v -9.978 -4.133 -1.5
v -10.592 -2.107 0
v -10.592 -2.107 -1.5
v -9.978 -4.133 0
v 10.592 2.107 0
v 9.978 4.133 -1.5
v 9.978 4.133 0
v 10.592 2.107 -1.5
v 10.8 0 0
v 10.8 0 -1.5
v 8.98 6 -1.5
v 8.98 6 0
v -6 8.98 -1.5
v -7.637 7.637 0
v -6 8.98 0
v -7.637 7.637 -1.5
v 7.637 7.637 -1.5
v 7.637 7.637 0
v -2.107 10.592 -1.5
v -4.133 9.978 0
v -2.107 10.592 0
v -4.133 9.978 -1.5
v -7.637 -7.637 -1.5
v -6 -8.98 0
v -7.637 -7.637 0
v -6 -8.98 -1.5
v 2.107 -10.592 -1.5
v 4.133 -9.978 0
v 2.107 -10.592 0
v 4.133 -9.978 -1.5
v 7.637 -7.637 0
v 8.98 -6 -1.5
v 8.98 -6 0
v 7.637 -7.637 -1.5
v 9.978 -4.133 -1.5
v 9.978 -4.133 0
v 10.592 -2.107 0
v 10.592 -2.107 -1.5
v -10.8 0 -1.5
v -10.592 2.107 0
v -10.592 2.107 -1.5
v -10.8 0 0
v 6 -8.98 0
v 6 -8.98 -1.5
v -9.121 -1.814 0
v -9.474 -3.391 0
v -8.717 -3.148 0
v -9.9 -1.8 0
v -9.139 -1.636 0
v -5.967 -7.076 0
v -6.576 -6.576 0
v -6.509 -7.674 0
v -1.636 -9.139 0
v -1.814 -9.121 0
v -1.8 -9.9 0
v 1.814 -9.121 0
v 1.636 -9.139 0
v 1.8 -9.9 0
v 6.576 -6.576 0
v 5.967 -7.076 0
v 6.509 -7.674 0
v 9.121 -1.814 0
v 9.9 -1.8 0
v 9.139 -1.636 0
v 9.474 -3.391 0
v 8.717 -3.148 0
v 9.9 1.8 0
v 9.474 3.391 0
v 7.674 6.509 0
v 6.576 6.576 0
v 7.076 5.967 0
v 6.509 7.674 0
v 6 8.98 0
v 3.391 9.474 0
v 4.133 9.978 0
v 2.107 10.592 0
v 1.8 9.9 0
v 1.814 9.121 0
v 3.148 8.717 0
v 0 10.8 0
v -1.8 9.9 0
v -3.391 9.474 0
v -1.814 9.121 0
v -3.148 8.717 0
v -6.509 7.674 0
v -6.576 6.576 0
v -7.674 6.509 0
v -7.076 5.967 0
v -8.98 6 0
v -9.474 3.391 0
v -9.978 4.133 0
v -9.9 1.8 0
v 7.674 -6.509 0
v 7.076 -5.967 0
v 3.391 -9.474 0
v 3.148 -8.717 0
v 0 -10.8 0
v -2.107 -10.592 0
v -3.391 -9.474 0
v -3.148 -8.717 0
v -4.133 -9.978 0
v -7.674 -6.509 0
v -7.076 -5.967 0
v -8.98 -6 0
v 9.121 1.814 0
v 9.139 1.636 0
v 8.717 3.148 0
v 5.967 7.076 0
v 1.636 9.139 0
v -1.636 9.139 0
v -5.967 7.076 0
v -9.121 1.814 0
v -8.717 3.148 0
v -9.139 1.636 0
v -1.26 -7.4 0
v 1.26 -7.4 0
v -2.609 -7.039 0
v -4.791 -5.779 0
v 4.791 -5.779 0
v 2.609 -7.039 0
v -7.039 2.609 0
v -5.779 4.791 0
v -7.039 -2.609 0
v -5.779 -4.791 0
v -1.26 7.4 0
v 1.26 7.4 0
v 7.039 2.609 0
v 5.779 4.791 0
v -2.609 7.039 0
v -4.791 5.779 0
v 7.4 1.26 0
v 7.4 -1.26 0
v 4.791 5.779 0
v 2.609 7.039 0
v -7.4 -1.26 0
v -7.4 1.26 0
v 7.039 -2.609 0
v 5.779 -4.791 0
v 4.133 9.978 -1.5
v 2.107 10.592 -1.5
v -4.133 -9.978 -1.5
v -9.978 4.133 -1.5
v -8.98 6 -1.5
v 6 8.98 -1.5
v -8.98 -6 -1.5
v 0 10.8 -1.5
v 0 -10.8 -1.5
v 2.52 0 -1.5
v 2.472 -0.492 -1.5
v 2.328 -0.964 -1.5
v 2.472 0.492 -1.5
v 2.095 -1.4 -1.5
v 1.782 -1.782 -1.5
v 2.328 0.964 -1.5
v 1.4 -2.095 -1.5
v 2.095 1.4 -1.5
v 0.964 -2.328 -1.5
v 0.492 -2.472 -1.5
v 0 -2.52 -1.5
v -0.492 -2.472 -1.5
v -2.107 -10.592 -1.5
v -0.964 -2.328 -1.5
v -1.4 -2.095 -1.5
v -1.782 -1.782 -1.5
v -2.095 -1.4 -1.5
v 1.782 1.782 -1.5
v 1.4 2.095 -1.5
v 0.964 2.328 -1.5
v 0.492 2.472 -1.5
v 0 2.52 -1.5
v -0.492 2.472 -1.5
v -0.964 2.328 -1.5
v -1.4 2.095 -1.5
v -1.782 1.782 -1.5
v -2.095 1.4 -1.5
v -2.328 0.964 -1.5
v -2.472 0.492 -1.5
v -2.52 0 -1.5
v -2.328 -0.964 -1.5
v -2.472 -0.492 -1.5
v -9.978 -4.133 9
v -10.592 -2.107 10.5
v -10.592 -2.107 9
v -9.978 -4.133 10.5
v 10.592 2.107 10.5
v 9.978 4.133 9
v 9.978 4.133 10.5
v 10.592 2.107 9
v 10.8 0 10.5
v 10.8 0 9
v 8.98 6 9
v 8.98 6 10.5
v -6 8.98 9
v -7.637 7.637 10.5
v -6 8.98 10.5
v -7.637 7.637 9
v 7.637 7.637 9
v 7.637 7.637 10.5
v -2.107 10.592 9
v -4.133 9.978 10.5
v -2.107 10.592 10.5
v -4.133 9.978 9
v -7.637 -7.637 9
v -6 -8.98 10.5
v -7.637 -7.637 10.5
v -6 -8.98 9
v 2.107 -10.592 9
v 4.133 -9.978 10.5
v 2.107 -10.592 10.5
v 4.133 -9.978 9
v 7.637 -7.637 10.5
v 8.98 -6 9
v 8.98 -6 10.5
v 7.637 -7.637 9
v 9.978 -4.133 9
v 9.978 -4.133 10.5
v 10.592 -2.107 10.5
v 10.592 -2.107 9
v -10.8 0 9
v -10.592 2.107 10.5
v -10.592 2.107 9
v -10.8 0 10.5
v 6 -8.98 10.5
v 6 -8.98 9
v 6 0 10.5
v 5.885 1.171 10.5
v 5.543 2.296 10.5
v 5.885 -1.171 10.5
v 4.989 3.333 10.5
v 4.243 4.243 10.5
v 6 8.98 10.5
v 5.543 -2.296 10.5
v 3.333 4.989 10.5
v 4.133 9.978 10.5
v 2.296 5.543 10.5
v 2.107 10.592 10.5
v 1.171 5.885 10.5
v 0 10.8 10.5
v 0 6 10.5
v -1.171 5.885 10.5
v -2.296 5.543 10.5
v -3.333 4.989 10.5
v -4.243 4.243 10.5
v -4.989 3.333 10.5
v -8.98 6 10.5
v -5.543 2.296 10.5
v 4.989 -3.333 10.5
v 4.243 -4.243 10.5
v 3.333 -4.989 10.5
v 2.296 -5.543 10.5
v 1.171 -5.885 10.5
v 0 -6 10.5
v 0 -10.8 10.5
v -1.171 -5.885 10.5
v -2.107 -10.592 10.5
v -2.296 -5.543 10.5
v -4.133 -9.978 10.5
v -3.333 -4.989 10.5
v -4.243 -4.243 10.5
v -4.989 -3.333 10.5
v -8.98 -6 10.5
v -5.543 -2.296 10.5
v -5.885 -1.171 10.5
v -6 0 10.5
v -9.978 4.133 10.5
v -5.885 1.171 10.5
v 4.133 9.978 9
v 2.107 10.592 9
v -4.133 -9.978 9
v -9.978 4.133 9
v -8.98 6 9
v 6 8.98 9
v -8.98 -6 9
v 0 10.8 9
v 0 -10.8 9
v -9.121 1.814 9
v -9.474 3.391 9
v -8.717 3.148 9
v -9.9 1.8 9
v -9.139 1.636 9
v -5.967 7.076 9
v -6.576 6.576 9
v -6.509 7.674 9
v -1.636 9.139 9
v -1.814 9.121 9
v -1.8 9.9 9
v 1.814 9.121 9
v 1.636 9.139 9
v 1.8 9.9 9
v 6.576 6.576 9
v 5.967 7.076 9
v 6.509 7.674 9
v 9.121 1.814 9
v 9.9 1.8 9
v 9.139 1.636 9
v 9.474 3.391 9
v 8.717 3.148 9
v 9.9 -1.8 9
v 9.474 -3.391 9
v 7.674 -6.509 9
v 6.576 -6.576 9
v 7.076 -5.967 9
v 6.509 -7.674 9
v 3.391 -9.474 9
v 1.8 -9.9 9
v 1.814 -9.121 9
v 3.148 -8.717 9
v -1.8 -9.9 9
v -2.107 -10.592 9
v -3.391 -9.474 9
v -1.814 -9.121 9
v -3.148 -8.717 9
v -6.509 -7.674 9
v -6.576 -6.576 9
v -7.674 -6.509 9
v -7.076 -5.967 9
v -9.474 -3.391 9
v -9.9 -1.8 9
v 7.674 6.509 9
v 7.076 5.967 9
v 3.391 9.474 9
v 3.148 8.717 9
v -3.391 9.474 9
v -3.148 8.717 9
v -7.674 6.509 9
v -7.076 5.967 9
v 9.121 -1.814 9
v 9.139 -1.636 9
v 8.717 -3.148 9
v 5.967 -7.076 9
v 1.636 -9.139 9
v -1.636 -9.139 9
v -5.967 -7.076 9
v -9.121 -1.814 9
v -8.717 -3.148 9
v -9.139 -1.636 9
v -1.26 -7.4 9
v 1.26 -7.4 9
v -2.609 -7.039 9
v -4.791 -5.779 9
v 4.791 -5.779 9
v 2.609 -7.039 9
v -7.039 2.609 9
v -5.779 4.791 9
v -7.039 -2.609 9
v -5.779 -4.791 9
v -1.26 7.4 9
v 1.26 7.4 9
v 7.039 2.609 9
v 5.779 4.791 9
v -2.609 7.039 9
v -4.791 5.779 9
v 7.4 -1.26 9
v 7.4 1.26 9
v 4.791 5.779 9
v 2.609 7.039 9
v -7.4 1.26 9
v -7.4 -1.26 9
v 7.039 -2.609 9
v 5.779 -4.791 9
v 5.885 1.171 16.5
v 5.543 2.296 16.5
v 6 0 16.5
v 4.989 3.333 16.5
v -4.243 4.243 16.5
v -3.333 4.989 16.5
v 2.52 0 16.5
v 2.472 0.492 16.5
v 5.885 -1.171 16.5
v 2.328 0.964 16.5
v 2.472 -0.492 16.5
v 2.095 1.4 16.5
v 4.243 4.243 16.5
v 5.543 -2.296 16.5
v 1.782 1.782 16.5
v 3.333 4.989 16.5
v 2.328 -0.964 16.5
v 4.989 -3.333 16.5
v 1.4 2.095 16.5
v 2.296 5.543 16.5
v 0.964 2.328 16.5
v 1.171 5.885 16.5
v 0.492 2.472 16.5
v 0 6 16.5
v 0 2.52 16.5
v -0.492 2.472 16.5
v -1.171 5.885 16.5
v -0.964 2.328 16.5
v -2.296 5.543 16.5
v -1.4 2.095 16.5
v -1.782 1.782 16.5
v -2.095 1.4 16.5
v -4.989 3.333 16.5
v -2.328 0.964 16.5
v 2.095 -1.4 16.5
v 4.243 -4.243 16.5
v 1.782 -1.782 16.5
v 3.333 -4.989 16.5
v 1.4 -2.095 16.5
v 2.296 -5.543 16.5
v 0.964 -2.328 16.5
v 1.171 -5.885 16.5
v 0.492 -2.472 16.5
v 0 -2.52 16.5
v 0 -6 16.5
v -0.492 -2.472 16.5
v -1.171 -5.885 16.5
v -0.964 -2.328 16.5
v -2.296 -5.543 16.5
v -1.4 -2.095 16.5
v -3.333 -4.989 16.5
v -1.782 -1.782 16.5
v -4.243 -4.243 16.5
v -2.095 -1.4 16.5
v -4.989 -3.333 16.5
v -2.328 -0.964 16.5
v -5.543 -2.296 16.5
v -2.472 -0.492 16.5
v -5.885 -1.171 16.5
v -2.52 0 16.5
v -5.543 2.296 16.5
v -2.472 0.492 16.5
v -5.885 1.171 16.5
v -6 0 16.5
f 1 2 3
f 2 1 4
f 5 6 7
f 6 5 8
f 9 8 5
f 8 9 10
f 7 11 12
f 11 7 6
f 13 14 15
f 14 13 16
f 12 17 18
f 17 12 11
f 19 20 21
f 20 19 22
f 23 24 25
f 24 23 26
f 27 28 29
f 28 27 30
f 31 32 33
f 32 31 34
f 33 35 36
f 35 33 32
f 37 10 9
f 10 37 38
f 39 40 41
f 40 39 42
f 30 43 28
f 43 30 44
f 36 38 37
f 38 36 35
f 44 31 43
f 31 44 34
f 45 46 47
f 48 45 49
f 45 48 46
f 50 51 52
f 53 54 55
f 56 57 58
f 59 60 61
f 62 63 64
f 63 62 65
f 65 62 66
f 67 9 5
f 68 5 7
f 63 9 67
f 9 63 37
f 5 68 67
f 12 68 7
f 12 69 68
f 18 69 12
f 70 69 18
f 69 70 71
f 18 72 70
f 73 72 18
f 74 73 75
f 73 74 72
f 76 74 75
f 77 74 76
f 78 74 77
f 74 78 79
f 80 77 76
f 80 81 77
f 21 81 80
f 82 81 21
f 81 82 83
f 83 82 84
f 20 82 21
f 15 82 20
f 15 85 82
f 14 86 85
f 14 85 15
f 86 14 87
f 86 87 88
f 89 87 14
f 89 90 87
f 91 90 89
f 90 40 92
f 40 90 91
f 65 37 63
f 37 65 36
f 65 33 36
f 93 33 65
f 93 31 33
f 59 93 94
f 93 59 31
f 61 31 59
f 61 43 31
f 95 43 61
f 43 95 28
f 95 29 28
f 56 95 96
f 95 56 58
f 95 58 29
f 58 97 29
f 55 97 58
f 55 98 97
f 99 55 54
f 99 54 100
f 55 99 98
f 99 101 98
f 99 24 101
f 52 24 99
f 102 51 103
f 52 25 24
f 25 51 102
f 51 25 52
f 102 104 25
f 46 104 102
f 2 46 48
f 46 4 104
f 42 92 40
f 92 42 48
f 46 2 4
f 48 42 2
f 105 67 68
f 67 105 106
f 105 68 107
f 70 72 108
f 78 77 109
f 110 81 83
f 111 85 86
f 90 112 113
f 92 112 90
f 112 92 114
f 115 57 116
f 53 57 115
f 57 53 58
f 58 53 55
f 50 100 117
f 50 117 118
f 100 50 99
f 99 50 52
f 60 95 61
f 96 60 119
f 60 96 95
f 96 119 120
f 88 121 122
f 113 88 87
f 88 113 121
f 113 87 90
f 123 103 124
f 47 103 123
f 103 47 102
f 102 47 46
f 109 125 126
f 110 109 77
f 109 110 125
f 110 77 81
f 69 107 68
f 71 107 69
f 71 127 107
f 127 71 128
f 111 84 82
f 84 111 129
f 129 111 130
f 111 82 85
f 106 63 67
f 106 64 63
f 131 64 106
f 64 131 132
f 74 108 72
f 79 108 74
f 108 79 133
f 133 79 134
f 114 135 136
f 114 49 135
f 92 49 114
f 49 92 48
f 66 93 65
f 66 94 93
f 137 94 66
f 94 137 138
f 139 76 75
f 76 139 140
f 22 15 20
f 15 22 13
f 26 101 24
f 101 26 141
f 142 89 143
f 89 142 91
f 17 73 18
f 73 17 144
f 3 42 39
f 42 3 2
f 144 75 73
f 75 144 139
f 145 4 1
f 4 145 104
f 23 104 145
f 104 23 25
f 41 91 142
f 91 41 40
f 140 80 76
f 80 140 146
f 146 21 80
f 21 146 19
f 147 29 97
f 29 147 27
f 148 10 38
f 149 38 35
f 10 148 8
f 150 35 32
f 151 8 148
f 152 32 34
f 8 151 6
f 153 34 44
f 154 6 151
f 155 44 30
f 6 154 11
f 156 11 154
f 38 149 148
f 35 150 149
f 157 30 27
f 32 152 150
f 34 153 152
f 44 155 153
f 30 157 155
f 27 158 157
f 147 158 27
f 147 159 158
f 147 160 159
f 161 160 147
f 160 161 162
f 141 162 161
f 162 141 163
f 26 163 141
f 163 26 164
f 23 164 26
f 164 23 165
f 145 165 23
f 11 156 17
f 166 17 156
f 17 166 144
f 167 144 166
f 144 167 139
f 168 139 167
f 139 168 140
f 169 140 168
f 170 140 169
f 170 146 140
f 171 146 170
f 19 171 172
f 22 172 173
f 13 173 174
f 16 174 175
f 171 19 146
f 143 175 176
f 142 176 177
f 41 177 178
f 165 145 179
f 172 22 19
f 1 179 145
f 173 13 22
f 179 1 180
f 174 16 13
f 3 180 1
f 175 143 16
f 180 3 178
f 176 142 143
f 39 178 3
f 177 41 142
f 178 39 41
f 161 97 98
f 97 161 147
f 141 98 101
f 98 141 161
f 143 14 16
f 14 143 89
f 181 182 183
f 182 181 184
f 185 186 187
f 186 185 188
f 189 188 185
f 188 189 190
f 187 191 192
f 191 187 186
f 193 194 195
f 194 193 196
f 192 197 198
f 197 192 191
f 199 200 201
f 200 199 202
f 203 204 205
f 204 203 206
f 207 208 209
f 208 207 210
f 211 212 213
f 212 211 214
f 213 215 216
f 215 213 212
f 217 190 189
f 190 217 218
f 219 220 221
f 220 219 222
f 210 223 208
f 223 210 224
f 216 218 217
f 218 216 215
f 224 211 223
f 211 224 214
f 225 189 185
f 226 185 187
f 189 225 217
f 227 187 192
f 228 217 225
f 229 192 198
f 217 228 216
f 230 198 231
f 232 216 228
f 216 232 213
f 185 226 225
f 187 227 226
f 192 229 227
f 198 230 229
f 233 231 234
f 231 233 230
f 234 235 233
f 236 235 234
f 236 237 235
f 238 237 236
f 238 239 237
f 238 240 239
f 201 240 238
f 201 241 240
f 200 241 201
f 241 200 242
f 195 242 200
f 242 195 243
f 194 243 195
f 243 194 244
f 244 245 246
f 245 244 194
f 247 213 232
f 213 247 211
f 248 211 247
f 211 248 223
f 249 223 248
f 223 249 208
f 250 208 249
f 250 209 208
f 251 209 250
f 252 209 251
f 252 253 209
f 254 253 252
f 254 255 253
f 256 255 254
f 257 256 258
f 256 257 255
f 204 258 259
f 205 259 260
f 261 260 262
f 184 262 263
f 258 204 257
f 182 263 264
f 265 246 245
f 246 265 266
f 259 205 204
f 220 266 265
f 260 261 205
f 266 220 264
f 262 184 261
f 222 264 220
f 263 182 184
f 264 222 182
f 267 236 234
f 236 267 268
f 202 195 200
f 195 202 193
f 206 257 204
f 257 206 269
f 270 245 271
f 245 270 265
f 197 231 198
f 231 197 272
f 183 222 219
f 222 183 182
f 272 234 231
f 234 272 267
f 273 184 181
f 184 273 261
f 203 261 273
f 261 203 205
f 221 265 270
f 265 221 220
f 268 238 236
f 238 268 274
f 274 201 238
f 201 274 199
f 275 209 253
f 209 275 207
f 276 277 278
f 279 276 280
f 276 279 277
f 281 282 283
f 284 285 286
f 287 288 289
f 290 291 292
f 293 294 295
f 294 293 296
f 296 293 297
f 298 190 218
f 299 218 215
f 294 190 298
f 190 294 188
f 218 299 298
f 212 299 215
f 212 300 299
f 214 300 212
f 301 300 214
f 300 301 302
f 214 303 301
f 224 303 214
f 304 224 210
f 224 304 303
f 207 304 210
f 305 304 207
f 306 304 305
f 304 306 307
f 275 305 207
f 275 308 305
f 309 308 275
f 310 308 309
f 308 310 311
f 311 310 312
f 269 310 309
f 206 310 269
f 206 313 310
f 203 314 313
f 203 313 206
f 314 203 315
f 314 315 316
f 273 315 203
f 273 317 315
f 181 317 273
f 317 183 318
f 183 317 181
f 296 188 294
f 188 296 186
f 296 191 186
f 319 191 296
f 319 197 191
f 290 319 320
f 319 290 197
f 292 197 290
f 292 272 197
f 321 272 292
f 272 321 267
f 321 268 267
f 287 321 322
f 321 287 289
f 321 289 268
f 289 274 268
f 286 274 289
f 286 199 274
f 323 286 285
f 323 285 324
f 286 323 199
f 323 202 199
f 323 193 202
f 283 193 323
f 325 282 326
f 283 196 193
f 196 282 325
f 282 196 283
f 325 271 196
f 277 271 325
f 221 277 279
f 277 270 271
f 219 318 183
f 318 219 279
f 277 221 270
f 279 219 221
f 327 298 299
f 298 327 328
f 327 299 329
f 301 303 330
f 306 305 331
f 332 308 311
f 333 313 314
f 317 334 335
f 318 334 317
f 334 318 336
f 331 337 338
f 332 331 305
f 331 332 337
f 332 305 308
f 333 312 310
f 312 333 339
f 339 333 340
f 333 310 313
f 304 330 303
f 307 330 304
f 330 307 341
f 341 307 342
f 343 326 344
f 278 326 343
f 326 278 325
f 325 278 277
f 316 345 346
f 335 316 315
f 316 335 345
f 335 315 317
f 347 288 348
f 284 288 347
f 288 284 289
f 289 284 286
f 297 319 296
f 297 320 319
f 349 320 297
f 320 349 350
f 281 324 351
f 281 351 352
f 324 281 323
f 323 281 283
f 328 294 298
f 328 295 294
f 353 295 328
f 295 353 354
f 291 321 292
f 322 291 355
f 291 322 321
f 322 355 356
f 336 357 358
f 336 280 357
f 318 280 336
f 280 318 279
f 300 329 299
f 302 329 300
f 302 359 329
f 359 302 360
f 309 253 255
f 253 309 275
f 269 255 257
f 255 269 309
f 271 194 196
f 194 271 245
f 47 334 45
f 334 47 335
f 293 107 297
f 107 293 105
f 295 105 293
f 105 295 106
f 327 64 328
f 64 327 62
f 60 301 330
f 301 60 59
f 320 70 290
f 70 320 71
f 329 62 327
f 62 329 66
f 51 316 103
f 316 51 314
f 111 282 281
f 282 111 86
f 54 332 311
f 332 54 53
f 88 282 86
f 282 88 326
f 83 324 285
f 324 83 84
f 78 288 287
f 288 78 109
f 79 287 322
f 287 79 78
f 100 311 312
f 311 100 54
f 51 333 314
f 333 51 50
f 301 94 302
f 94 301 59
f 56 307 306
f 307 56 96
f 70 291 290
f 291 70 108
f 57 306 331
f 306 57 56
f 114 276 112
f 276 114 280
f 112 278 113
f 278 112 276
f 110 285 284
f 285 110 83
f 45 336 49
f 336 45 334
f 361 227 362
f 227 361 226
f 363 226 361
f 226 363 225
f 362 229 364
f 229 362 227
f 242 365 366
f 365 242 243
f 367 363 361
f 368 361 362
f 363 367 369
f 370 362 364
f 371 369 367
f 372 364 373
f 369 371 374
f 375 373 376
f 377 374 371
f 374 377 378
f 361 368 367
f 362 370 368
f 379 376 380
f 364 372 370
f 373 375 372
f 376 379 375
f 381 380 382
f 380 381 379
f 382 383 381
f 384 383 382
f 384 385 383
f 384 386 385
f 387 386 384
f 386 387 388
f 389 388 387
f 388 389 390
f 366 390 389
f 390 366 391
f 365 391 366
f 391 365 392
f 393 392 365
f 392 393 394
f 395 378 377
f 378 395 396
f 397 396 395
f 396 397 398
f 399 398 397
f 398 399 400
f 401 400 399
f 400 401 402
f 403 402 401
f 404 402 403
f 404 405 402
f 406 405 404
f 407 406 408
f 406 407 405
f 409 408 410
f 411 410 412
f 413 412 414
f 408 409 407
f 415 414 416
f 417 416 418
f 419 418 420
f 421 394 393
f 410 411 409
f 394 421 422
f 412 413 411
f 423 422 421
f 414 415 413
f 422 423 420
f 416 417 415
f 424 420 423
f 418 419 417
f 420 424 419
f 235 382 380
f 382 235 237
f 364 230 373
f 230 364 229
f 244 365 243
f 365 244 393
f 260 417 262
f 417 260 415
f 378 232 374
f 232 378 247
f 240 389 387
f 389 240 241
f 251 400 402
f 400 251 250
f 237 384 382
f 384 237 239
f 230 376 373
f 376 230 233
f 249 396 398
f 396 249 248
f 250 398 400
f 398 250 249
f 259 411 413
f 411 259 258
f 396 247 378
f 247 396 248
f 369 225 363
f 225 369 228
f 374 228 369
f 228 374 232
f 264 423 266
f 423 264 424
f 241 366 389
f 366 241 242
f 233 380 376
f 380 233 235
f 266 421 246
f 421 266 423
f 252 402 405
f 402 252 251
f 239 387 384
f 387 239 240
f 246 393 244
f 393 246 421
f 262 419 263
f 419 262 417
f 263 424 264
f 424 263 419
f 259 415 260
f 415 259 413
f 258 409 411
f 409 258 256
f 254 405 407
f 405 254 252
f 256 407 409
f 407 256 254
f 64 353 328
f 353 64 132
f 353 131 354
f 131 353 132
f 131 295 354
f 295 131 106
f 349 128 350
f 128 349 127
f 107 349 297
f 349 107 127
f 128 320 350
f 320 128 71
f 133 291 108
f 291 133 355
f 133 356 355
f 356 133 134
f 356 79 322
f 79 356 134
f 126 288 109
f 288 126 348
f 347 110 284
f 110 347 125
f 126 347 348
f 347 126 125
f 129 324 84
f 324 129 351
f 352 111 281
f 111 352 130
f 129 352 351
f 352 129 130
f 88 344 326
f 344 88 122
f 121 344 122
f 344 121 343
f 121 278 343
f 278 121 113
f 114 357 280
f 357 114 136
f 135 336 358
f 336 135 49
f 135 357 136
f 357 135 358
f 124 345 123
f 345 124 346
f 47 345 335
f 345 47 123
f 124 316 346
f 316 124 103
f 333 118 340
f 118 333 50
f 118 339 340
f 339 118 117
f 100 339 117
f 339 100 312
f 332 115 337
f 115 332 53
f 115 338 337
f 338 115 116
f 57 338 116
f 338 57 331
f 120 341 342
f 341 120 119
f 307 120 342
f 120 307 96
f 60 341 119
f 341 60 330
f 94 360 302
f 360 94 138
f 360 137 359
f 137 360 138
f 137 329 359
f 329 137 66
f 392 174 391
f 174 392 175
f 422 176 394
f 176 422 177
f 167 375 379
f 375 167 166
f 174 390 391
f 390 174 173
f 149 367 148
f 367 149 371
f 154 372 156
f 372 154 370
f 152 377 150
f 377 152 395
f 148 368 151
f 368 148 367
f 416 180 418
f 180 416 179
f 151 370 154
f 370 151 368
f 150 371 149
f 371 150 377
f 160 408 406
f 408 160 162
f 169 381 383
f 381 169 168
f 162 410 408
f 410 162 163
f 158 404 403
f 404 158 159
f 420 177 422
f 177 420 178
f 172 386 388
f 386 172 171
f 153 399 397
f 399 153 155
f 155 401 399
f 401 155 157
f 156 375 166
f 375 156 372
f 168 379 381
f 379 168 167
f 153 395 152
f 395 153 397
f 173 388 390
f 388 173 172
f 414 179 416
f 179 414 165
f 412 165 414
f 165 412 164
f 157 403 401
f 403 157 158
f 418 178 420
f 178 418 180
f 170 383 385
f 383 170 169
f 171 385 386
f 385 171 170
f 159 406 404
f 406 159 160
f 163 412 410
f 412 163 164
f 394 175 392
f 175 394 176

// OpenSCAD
$fn = 32;

// ----------------------------------------------------------------------
// Timing pulley: T5 12T, pitch 5 mm, 21.6 mm x 18 mm
// ----------------------------------------------------------------------

// --- parameters (mm) ---
pitch_mm = 5;             // belt pitch
tooth_count = 12;         // number of grooves
width = 9;                // belt width between the flanges
tip_d = 18.6;             // tip circle diameter
root_d = 16;              // groove bottom diameter
groove_h = 1.3;           // groove depth
tooth_w = 3;              // groove width at the tip circle
side_d = 21.6;            // flange diameter
side_t = 1.5;             // flange thickness
spigot_d = 14.4;          // flange spigot, sunk into the rim
spigot_h = 1.2;           // spigot depth into the rim
hub_bore = 5.04;          // shaft bore
hub_d = 12;               // hub diameter
hub_h = 6;                // hub above the flange
bottom_z = -1.5;          // lowest point of the pulley
top_z = 16.5;             // highest point of the pulley

module rim() {
  cylinder(h = width, d = tip_d);
}

module groove_cutter() {
  /* belt tooth groove: deeper than wide, cut through the belt width */
  translate([root_d / 2, 0, 0])
    linear_extrude(height = width)
      polygon(points = [[-0.6, -tooth_w * 0.42], [groove_h + 0.6, -tooth_w * 0.6],
                        [groove_h + 0.6, tooth_w * 0.6], [-0.6, tooth_w * 0.42]]);
}

module flanges() {
  translate([0, 0, -side_t]) cylinder(h = side_t, d = side_d);
  translate([0, 0, width]) cylinder(h = side_t, d = side_d);
  translate([0, 0, -spigot_h]) cylinder(h = spigot_h + 0.6, d = spigot_d);
  translate([0, 0, width - 0.6]) cylinder(h = spigot_h + 0.6, d = spigot_d);
}

module hub() {
  translate([0, 0, bottom_z]) cylinder(h = top_z - bottom_z, d = hub_d);
}

difference() {
  union() {
    rim();
    hub();
    flanges();
  }
  for (i = [0 : tooth_count - 1]) rotate([0, 0, i * 360 / tooth_count]) groove_cutter();
  translate([0, 0, bottom_z - 1]) cylinder(h = top_z - bottom_z + 2, d = hub_bore);
}
